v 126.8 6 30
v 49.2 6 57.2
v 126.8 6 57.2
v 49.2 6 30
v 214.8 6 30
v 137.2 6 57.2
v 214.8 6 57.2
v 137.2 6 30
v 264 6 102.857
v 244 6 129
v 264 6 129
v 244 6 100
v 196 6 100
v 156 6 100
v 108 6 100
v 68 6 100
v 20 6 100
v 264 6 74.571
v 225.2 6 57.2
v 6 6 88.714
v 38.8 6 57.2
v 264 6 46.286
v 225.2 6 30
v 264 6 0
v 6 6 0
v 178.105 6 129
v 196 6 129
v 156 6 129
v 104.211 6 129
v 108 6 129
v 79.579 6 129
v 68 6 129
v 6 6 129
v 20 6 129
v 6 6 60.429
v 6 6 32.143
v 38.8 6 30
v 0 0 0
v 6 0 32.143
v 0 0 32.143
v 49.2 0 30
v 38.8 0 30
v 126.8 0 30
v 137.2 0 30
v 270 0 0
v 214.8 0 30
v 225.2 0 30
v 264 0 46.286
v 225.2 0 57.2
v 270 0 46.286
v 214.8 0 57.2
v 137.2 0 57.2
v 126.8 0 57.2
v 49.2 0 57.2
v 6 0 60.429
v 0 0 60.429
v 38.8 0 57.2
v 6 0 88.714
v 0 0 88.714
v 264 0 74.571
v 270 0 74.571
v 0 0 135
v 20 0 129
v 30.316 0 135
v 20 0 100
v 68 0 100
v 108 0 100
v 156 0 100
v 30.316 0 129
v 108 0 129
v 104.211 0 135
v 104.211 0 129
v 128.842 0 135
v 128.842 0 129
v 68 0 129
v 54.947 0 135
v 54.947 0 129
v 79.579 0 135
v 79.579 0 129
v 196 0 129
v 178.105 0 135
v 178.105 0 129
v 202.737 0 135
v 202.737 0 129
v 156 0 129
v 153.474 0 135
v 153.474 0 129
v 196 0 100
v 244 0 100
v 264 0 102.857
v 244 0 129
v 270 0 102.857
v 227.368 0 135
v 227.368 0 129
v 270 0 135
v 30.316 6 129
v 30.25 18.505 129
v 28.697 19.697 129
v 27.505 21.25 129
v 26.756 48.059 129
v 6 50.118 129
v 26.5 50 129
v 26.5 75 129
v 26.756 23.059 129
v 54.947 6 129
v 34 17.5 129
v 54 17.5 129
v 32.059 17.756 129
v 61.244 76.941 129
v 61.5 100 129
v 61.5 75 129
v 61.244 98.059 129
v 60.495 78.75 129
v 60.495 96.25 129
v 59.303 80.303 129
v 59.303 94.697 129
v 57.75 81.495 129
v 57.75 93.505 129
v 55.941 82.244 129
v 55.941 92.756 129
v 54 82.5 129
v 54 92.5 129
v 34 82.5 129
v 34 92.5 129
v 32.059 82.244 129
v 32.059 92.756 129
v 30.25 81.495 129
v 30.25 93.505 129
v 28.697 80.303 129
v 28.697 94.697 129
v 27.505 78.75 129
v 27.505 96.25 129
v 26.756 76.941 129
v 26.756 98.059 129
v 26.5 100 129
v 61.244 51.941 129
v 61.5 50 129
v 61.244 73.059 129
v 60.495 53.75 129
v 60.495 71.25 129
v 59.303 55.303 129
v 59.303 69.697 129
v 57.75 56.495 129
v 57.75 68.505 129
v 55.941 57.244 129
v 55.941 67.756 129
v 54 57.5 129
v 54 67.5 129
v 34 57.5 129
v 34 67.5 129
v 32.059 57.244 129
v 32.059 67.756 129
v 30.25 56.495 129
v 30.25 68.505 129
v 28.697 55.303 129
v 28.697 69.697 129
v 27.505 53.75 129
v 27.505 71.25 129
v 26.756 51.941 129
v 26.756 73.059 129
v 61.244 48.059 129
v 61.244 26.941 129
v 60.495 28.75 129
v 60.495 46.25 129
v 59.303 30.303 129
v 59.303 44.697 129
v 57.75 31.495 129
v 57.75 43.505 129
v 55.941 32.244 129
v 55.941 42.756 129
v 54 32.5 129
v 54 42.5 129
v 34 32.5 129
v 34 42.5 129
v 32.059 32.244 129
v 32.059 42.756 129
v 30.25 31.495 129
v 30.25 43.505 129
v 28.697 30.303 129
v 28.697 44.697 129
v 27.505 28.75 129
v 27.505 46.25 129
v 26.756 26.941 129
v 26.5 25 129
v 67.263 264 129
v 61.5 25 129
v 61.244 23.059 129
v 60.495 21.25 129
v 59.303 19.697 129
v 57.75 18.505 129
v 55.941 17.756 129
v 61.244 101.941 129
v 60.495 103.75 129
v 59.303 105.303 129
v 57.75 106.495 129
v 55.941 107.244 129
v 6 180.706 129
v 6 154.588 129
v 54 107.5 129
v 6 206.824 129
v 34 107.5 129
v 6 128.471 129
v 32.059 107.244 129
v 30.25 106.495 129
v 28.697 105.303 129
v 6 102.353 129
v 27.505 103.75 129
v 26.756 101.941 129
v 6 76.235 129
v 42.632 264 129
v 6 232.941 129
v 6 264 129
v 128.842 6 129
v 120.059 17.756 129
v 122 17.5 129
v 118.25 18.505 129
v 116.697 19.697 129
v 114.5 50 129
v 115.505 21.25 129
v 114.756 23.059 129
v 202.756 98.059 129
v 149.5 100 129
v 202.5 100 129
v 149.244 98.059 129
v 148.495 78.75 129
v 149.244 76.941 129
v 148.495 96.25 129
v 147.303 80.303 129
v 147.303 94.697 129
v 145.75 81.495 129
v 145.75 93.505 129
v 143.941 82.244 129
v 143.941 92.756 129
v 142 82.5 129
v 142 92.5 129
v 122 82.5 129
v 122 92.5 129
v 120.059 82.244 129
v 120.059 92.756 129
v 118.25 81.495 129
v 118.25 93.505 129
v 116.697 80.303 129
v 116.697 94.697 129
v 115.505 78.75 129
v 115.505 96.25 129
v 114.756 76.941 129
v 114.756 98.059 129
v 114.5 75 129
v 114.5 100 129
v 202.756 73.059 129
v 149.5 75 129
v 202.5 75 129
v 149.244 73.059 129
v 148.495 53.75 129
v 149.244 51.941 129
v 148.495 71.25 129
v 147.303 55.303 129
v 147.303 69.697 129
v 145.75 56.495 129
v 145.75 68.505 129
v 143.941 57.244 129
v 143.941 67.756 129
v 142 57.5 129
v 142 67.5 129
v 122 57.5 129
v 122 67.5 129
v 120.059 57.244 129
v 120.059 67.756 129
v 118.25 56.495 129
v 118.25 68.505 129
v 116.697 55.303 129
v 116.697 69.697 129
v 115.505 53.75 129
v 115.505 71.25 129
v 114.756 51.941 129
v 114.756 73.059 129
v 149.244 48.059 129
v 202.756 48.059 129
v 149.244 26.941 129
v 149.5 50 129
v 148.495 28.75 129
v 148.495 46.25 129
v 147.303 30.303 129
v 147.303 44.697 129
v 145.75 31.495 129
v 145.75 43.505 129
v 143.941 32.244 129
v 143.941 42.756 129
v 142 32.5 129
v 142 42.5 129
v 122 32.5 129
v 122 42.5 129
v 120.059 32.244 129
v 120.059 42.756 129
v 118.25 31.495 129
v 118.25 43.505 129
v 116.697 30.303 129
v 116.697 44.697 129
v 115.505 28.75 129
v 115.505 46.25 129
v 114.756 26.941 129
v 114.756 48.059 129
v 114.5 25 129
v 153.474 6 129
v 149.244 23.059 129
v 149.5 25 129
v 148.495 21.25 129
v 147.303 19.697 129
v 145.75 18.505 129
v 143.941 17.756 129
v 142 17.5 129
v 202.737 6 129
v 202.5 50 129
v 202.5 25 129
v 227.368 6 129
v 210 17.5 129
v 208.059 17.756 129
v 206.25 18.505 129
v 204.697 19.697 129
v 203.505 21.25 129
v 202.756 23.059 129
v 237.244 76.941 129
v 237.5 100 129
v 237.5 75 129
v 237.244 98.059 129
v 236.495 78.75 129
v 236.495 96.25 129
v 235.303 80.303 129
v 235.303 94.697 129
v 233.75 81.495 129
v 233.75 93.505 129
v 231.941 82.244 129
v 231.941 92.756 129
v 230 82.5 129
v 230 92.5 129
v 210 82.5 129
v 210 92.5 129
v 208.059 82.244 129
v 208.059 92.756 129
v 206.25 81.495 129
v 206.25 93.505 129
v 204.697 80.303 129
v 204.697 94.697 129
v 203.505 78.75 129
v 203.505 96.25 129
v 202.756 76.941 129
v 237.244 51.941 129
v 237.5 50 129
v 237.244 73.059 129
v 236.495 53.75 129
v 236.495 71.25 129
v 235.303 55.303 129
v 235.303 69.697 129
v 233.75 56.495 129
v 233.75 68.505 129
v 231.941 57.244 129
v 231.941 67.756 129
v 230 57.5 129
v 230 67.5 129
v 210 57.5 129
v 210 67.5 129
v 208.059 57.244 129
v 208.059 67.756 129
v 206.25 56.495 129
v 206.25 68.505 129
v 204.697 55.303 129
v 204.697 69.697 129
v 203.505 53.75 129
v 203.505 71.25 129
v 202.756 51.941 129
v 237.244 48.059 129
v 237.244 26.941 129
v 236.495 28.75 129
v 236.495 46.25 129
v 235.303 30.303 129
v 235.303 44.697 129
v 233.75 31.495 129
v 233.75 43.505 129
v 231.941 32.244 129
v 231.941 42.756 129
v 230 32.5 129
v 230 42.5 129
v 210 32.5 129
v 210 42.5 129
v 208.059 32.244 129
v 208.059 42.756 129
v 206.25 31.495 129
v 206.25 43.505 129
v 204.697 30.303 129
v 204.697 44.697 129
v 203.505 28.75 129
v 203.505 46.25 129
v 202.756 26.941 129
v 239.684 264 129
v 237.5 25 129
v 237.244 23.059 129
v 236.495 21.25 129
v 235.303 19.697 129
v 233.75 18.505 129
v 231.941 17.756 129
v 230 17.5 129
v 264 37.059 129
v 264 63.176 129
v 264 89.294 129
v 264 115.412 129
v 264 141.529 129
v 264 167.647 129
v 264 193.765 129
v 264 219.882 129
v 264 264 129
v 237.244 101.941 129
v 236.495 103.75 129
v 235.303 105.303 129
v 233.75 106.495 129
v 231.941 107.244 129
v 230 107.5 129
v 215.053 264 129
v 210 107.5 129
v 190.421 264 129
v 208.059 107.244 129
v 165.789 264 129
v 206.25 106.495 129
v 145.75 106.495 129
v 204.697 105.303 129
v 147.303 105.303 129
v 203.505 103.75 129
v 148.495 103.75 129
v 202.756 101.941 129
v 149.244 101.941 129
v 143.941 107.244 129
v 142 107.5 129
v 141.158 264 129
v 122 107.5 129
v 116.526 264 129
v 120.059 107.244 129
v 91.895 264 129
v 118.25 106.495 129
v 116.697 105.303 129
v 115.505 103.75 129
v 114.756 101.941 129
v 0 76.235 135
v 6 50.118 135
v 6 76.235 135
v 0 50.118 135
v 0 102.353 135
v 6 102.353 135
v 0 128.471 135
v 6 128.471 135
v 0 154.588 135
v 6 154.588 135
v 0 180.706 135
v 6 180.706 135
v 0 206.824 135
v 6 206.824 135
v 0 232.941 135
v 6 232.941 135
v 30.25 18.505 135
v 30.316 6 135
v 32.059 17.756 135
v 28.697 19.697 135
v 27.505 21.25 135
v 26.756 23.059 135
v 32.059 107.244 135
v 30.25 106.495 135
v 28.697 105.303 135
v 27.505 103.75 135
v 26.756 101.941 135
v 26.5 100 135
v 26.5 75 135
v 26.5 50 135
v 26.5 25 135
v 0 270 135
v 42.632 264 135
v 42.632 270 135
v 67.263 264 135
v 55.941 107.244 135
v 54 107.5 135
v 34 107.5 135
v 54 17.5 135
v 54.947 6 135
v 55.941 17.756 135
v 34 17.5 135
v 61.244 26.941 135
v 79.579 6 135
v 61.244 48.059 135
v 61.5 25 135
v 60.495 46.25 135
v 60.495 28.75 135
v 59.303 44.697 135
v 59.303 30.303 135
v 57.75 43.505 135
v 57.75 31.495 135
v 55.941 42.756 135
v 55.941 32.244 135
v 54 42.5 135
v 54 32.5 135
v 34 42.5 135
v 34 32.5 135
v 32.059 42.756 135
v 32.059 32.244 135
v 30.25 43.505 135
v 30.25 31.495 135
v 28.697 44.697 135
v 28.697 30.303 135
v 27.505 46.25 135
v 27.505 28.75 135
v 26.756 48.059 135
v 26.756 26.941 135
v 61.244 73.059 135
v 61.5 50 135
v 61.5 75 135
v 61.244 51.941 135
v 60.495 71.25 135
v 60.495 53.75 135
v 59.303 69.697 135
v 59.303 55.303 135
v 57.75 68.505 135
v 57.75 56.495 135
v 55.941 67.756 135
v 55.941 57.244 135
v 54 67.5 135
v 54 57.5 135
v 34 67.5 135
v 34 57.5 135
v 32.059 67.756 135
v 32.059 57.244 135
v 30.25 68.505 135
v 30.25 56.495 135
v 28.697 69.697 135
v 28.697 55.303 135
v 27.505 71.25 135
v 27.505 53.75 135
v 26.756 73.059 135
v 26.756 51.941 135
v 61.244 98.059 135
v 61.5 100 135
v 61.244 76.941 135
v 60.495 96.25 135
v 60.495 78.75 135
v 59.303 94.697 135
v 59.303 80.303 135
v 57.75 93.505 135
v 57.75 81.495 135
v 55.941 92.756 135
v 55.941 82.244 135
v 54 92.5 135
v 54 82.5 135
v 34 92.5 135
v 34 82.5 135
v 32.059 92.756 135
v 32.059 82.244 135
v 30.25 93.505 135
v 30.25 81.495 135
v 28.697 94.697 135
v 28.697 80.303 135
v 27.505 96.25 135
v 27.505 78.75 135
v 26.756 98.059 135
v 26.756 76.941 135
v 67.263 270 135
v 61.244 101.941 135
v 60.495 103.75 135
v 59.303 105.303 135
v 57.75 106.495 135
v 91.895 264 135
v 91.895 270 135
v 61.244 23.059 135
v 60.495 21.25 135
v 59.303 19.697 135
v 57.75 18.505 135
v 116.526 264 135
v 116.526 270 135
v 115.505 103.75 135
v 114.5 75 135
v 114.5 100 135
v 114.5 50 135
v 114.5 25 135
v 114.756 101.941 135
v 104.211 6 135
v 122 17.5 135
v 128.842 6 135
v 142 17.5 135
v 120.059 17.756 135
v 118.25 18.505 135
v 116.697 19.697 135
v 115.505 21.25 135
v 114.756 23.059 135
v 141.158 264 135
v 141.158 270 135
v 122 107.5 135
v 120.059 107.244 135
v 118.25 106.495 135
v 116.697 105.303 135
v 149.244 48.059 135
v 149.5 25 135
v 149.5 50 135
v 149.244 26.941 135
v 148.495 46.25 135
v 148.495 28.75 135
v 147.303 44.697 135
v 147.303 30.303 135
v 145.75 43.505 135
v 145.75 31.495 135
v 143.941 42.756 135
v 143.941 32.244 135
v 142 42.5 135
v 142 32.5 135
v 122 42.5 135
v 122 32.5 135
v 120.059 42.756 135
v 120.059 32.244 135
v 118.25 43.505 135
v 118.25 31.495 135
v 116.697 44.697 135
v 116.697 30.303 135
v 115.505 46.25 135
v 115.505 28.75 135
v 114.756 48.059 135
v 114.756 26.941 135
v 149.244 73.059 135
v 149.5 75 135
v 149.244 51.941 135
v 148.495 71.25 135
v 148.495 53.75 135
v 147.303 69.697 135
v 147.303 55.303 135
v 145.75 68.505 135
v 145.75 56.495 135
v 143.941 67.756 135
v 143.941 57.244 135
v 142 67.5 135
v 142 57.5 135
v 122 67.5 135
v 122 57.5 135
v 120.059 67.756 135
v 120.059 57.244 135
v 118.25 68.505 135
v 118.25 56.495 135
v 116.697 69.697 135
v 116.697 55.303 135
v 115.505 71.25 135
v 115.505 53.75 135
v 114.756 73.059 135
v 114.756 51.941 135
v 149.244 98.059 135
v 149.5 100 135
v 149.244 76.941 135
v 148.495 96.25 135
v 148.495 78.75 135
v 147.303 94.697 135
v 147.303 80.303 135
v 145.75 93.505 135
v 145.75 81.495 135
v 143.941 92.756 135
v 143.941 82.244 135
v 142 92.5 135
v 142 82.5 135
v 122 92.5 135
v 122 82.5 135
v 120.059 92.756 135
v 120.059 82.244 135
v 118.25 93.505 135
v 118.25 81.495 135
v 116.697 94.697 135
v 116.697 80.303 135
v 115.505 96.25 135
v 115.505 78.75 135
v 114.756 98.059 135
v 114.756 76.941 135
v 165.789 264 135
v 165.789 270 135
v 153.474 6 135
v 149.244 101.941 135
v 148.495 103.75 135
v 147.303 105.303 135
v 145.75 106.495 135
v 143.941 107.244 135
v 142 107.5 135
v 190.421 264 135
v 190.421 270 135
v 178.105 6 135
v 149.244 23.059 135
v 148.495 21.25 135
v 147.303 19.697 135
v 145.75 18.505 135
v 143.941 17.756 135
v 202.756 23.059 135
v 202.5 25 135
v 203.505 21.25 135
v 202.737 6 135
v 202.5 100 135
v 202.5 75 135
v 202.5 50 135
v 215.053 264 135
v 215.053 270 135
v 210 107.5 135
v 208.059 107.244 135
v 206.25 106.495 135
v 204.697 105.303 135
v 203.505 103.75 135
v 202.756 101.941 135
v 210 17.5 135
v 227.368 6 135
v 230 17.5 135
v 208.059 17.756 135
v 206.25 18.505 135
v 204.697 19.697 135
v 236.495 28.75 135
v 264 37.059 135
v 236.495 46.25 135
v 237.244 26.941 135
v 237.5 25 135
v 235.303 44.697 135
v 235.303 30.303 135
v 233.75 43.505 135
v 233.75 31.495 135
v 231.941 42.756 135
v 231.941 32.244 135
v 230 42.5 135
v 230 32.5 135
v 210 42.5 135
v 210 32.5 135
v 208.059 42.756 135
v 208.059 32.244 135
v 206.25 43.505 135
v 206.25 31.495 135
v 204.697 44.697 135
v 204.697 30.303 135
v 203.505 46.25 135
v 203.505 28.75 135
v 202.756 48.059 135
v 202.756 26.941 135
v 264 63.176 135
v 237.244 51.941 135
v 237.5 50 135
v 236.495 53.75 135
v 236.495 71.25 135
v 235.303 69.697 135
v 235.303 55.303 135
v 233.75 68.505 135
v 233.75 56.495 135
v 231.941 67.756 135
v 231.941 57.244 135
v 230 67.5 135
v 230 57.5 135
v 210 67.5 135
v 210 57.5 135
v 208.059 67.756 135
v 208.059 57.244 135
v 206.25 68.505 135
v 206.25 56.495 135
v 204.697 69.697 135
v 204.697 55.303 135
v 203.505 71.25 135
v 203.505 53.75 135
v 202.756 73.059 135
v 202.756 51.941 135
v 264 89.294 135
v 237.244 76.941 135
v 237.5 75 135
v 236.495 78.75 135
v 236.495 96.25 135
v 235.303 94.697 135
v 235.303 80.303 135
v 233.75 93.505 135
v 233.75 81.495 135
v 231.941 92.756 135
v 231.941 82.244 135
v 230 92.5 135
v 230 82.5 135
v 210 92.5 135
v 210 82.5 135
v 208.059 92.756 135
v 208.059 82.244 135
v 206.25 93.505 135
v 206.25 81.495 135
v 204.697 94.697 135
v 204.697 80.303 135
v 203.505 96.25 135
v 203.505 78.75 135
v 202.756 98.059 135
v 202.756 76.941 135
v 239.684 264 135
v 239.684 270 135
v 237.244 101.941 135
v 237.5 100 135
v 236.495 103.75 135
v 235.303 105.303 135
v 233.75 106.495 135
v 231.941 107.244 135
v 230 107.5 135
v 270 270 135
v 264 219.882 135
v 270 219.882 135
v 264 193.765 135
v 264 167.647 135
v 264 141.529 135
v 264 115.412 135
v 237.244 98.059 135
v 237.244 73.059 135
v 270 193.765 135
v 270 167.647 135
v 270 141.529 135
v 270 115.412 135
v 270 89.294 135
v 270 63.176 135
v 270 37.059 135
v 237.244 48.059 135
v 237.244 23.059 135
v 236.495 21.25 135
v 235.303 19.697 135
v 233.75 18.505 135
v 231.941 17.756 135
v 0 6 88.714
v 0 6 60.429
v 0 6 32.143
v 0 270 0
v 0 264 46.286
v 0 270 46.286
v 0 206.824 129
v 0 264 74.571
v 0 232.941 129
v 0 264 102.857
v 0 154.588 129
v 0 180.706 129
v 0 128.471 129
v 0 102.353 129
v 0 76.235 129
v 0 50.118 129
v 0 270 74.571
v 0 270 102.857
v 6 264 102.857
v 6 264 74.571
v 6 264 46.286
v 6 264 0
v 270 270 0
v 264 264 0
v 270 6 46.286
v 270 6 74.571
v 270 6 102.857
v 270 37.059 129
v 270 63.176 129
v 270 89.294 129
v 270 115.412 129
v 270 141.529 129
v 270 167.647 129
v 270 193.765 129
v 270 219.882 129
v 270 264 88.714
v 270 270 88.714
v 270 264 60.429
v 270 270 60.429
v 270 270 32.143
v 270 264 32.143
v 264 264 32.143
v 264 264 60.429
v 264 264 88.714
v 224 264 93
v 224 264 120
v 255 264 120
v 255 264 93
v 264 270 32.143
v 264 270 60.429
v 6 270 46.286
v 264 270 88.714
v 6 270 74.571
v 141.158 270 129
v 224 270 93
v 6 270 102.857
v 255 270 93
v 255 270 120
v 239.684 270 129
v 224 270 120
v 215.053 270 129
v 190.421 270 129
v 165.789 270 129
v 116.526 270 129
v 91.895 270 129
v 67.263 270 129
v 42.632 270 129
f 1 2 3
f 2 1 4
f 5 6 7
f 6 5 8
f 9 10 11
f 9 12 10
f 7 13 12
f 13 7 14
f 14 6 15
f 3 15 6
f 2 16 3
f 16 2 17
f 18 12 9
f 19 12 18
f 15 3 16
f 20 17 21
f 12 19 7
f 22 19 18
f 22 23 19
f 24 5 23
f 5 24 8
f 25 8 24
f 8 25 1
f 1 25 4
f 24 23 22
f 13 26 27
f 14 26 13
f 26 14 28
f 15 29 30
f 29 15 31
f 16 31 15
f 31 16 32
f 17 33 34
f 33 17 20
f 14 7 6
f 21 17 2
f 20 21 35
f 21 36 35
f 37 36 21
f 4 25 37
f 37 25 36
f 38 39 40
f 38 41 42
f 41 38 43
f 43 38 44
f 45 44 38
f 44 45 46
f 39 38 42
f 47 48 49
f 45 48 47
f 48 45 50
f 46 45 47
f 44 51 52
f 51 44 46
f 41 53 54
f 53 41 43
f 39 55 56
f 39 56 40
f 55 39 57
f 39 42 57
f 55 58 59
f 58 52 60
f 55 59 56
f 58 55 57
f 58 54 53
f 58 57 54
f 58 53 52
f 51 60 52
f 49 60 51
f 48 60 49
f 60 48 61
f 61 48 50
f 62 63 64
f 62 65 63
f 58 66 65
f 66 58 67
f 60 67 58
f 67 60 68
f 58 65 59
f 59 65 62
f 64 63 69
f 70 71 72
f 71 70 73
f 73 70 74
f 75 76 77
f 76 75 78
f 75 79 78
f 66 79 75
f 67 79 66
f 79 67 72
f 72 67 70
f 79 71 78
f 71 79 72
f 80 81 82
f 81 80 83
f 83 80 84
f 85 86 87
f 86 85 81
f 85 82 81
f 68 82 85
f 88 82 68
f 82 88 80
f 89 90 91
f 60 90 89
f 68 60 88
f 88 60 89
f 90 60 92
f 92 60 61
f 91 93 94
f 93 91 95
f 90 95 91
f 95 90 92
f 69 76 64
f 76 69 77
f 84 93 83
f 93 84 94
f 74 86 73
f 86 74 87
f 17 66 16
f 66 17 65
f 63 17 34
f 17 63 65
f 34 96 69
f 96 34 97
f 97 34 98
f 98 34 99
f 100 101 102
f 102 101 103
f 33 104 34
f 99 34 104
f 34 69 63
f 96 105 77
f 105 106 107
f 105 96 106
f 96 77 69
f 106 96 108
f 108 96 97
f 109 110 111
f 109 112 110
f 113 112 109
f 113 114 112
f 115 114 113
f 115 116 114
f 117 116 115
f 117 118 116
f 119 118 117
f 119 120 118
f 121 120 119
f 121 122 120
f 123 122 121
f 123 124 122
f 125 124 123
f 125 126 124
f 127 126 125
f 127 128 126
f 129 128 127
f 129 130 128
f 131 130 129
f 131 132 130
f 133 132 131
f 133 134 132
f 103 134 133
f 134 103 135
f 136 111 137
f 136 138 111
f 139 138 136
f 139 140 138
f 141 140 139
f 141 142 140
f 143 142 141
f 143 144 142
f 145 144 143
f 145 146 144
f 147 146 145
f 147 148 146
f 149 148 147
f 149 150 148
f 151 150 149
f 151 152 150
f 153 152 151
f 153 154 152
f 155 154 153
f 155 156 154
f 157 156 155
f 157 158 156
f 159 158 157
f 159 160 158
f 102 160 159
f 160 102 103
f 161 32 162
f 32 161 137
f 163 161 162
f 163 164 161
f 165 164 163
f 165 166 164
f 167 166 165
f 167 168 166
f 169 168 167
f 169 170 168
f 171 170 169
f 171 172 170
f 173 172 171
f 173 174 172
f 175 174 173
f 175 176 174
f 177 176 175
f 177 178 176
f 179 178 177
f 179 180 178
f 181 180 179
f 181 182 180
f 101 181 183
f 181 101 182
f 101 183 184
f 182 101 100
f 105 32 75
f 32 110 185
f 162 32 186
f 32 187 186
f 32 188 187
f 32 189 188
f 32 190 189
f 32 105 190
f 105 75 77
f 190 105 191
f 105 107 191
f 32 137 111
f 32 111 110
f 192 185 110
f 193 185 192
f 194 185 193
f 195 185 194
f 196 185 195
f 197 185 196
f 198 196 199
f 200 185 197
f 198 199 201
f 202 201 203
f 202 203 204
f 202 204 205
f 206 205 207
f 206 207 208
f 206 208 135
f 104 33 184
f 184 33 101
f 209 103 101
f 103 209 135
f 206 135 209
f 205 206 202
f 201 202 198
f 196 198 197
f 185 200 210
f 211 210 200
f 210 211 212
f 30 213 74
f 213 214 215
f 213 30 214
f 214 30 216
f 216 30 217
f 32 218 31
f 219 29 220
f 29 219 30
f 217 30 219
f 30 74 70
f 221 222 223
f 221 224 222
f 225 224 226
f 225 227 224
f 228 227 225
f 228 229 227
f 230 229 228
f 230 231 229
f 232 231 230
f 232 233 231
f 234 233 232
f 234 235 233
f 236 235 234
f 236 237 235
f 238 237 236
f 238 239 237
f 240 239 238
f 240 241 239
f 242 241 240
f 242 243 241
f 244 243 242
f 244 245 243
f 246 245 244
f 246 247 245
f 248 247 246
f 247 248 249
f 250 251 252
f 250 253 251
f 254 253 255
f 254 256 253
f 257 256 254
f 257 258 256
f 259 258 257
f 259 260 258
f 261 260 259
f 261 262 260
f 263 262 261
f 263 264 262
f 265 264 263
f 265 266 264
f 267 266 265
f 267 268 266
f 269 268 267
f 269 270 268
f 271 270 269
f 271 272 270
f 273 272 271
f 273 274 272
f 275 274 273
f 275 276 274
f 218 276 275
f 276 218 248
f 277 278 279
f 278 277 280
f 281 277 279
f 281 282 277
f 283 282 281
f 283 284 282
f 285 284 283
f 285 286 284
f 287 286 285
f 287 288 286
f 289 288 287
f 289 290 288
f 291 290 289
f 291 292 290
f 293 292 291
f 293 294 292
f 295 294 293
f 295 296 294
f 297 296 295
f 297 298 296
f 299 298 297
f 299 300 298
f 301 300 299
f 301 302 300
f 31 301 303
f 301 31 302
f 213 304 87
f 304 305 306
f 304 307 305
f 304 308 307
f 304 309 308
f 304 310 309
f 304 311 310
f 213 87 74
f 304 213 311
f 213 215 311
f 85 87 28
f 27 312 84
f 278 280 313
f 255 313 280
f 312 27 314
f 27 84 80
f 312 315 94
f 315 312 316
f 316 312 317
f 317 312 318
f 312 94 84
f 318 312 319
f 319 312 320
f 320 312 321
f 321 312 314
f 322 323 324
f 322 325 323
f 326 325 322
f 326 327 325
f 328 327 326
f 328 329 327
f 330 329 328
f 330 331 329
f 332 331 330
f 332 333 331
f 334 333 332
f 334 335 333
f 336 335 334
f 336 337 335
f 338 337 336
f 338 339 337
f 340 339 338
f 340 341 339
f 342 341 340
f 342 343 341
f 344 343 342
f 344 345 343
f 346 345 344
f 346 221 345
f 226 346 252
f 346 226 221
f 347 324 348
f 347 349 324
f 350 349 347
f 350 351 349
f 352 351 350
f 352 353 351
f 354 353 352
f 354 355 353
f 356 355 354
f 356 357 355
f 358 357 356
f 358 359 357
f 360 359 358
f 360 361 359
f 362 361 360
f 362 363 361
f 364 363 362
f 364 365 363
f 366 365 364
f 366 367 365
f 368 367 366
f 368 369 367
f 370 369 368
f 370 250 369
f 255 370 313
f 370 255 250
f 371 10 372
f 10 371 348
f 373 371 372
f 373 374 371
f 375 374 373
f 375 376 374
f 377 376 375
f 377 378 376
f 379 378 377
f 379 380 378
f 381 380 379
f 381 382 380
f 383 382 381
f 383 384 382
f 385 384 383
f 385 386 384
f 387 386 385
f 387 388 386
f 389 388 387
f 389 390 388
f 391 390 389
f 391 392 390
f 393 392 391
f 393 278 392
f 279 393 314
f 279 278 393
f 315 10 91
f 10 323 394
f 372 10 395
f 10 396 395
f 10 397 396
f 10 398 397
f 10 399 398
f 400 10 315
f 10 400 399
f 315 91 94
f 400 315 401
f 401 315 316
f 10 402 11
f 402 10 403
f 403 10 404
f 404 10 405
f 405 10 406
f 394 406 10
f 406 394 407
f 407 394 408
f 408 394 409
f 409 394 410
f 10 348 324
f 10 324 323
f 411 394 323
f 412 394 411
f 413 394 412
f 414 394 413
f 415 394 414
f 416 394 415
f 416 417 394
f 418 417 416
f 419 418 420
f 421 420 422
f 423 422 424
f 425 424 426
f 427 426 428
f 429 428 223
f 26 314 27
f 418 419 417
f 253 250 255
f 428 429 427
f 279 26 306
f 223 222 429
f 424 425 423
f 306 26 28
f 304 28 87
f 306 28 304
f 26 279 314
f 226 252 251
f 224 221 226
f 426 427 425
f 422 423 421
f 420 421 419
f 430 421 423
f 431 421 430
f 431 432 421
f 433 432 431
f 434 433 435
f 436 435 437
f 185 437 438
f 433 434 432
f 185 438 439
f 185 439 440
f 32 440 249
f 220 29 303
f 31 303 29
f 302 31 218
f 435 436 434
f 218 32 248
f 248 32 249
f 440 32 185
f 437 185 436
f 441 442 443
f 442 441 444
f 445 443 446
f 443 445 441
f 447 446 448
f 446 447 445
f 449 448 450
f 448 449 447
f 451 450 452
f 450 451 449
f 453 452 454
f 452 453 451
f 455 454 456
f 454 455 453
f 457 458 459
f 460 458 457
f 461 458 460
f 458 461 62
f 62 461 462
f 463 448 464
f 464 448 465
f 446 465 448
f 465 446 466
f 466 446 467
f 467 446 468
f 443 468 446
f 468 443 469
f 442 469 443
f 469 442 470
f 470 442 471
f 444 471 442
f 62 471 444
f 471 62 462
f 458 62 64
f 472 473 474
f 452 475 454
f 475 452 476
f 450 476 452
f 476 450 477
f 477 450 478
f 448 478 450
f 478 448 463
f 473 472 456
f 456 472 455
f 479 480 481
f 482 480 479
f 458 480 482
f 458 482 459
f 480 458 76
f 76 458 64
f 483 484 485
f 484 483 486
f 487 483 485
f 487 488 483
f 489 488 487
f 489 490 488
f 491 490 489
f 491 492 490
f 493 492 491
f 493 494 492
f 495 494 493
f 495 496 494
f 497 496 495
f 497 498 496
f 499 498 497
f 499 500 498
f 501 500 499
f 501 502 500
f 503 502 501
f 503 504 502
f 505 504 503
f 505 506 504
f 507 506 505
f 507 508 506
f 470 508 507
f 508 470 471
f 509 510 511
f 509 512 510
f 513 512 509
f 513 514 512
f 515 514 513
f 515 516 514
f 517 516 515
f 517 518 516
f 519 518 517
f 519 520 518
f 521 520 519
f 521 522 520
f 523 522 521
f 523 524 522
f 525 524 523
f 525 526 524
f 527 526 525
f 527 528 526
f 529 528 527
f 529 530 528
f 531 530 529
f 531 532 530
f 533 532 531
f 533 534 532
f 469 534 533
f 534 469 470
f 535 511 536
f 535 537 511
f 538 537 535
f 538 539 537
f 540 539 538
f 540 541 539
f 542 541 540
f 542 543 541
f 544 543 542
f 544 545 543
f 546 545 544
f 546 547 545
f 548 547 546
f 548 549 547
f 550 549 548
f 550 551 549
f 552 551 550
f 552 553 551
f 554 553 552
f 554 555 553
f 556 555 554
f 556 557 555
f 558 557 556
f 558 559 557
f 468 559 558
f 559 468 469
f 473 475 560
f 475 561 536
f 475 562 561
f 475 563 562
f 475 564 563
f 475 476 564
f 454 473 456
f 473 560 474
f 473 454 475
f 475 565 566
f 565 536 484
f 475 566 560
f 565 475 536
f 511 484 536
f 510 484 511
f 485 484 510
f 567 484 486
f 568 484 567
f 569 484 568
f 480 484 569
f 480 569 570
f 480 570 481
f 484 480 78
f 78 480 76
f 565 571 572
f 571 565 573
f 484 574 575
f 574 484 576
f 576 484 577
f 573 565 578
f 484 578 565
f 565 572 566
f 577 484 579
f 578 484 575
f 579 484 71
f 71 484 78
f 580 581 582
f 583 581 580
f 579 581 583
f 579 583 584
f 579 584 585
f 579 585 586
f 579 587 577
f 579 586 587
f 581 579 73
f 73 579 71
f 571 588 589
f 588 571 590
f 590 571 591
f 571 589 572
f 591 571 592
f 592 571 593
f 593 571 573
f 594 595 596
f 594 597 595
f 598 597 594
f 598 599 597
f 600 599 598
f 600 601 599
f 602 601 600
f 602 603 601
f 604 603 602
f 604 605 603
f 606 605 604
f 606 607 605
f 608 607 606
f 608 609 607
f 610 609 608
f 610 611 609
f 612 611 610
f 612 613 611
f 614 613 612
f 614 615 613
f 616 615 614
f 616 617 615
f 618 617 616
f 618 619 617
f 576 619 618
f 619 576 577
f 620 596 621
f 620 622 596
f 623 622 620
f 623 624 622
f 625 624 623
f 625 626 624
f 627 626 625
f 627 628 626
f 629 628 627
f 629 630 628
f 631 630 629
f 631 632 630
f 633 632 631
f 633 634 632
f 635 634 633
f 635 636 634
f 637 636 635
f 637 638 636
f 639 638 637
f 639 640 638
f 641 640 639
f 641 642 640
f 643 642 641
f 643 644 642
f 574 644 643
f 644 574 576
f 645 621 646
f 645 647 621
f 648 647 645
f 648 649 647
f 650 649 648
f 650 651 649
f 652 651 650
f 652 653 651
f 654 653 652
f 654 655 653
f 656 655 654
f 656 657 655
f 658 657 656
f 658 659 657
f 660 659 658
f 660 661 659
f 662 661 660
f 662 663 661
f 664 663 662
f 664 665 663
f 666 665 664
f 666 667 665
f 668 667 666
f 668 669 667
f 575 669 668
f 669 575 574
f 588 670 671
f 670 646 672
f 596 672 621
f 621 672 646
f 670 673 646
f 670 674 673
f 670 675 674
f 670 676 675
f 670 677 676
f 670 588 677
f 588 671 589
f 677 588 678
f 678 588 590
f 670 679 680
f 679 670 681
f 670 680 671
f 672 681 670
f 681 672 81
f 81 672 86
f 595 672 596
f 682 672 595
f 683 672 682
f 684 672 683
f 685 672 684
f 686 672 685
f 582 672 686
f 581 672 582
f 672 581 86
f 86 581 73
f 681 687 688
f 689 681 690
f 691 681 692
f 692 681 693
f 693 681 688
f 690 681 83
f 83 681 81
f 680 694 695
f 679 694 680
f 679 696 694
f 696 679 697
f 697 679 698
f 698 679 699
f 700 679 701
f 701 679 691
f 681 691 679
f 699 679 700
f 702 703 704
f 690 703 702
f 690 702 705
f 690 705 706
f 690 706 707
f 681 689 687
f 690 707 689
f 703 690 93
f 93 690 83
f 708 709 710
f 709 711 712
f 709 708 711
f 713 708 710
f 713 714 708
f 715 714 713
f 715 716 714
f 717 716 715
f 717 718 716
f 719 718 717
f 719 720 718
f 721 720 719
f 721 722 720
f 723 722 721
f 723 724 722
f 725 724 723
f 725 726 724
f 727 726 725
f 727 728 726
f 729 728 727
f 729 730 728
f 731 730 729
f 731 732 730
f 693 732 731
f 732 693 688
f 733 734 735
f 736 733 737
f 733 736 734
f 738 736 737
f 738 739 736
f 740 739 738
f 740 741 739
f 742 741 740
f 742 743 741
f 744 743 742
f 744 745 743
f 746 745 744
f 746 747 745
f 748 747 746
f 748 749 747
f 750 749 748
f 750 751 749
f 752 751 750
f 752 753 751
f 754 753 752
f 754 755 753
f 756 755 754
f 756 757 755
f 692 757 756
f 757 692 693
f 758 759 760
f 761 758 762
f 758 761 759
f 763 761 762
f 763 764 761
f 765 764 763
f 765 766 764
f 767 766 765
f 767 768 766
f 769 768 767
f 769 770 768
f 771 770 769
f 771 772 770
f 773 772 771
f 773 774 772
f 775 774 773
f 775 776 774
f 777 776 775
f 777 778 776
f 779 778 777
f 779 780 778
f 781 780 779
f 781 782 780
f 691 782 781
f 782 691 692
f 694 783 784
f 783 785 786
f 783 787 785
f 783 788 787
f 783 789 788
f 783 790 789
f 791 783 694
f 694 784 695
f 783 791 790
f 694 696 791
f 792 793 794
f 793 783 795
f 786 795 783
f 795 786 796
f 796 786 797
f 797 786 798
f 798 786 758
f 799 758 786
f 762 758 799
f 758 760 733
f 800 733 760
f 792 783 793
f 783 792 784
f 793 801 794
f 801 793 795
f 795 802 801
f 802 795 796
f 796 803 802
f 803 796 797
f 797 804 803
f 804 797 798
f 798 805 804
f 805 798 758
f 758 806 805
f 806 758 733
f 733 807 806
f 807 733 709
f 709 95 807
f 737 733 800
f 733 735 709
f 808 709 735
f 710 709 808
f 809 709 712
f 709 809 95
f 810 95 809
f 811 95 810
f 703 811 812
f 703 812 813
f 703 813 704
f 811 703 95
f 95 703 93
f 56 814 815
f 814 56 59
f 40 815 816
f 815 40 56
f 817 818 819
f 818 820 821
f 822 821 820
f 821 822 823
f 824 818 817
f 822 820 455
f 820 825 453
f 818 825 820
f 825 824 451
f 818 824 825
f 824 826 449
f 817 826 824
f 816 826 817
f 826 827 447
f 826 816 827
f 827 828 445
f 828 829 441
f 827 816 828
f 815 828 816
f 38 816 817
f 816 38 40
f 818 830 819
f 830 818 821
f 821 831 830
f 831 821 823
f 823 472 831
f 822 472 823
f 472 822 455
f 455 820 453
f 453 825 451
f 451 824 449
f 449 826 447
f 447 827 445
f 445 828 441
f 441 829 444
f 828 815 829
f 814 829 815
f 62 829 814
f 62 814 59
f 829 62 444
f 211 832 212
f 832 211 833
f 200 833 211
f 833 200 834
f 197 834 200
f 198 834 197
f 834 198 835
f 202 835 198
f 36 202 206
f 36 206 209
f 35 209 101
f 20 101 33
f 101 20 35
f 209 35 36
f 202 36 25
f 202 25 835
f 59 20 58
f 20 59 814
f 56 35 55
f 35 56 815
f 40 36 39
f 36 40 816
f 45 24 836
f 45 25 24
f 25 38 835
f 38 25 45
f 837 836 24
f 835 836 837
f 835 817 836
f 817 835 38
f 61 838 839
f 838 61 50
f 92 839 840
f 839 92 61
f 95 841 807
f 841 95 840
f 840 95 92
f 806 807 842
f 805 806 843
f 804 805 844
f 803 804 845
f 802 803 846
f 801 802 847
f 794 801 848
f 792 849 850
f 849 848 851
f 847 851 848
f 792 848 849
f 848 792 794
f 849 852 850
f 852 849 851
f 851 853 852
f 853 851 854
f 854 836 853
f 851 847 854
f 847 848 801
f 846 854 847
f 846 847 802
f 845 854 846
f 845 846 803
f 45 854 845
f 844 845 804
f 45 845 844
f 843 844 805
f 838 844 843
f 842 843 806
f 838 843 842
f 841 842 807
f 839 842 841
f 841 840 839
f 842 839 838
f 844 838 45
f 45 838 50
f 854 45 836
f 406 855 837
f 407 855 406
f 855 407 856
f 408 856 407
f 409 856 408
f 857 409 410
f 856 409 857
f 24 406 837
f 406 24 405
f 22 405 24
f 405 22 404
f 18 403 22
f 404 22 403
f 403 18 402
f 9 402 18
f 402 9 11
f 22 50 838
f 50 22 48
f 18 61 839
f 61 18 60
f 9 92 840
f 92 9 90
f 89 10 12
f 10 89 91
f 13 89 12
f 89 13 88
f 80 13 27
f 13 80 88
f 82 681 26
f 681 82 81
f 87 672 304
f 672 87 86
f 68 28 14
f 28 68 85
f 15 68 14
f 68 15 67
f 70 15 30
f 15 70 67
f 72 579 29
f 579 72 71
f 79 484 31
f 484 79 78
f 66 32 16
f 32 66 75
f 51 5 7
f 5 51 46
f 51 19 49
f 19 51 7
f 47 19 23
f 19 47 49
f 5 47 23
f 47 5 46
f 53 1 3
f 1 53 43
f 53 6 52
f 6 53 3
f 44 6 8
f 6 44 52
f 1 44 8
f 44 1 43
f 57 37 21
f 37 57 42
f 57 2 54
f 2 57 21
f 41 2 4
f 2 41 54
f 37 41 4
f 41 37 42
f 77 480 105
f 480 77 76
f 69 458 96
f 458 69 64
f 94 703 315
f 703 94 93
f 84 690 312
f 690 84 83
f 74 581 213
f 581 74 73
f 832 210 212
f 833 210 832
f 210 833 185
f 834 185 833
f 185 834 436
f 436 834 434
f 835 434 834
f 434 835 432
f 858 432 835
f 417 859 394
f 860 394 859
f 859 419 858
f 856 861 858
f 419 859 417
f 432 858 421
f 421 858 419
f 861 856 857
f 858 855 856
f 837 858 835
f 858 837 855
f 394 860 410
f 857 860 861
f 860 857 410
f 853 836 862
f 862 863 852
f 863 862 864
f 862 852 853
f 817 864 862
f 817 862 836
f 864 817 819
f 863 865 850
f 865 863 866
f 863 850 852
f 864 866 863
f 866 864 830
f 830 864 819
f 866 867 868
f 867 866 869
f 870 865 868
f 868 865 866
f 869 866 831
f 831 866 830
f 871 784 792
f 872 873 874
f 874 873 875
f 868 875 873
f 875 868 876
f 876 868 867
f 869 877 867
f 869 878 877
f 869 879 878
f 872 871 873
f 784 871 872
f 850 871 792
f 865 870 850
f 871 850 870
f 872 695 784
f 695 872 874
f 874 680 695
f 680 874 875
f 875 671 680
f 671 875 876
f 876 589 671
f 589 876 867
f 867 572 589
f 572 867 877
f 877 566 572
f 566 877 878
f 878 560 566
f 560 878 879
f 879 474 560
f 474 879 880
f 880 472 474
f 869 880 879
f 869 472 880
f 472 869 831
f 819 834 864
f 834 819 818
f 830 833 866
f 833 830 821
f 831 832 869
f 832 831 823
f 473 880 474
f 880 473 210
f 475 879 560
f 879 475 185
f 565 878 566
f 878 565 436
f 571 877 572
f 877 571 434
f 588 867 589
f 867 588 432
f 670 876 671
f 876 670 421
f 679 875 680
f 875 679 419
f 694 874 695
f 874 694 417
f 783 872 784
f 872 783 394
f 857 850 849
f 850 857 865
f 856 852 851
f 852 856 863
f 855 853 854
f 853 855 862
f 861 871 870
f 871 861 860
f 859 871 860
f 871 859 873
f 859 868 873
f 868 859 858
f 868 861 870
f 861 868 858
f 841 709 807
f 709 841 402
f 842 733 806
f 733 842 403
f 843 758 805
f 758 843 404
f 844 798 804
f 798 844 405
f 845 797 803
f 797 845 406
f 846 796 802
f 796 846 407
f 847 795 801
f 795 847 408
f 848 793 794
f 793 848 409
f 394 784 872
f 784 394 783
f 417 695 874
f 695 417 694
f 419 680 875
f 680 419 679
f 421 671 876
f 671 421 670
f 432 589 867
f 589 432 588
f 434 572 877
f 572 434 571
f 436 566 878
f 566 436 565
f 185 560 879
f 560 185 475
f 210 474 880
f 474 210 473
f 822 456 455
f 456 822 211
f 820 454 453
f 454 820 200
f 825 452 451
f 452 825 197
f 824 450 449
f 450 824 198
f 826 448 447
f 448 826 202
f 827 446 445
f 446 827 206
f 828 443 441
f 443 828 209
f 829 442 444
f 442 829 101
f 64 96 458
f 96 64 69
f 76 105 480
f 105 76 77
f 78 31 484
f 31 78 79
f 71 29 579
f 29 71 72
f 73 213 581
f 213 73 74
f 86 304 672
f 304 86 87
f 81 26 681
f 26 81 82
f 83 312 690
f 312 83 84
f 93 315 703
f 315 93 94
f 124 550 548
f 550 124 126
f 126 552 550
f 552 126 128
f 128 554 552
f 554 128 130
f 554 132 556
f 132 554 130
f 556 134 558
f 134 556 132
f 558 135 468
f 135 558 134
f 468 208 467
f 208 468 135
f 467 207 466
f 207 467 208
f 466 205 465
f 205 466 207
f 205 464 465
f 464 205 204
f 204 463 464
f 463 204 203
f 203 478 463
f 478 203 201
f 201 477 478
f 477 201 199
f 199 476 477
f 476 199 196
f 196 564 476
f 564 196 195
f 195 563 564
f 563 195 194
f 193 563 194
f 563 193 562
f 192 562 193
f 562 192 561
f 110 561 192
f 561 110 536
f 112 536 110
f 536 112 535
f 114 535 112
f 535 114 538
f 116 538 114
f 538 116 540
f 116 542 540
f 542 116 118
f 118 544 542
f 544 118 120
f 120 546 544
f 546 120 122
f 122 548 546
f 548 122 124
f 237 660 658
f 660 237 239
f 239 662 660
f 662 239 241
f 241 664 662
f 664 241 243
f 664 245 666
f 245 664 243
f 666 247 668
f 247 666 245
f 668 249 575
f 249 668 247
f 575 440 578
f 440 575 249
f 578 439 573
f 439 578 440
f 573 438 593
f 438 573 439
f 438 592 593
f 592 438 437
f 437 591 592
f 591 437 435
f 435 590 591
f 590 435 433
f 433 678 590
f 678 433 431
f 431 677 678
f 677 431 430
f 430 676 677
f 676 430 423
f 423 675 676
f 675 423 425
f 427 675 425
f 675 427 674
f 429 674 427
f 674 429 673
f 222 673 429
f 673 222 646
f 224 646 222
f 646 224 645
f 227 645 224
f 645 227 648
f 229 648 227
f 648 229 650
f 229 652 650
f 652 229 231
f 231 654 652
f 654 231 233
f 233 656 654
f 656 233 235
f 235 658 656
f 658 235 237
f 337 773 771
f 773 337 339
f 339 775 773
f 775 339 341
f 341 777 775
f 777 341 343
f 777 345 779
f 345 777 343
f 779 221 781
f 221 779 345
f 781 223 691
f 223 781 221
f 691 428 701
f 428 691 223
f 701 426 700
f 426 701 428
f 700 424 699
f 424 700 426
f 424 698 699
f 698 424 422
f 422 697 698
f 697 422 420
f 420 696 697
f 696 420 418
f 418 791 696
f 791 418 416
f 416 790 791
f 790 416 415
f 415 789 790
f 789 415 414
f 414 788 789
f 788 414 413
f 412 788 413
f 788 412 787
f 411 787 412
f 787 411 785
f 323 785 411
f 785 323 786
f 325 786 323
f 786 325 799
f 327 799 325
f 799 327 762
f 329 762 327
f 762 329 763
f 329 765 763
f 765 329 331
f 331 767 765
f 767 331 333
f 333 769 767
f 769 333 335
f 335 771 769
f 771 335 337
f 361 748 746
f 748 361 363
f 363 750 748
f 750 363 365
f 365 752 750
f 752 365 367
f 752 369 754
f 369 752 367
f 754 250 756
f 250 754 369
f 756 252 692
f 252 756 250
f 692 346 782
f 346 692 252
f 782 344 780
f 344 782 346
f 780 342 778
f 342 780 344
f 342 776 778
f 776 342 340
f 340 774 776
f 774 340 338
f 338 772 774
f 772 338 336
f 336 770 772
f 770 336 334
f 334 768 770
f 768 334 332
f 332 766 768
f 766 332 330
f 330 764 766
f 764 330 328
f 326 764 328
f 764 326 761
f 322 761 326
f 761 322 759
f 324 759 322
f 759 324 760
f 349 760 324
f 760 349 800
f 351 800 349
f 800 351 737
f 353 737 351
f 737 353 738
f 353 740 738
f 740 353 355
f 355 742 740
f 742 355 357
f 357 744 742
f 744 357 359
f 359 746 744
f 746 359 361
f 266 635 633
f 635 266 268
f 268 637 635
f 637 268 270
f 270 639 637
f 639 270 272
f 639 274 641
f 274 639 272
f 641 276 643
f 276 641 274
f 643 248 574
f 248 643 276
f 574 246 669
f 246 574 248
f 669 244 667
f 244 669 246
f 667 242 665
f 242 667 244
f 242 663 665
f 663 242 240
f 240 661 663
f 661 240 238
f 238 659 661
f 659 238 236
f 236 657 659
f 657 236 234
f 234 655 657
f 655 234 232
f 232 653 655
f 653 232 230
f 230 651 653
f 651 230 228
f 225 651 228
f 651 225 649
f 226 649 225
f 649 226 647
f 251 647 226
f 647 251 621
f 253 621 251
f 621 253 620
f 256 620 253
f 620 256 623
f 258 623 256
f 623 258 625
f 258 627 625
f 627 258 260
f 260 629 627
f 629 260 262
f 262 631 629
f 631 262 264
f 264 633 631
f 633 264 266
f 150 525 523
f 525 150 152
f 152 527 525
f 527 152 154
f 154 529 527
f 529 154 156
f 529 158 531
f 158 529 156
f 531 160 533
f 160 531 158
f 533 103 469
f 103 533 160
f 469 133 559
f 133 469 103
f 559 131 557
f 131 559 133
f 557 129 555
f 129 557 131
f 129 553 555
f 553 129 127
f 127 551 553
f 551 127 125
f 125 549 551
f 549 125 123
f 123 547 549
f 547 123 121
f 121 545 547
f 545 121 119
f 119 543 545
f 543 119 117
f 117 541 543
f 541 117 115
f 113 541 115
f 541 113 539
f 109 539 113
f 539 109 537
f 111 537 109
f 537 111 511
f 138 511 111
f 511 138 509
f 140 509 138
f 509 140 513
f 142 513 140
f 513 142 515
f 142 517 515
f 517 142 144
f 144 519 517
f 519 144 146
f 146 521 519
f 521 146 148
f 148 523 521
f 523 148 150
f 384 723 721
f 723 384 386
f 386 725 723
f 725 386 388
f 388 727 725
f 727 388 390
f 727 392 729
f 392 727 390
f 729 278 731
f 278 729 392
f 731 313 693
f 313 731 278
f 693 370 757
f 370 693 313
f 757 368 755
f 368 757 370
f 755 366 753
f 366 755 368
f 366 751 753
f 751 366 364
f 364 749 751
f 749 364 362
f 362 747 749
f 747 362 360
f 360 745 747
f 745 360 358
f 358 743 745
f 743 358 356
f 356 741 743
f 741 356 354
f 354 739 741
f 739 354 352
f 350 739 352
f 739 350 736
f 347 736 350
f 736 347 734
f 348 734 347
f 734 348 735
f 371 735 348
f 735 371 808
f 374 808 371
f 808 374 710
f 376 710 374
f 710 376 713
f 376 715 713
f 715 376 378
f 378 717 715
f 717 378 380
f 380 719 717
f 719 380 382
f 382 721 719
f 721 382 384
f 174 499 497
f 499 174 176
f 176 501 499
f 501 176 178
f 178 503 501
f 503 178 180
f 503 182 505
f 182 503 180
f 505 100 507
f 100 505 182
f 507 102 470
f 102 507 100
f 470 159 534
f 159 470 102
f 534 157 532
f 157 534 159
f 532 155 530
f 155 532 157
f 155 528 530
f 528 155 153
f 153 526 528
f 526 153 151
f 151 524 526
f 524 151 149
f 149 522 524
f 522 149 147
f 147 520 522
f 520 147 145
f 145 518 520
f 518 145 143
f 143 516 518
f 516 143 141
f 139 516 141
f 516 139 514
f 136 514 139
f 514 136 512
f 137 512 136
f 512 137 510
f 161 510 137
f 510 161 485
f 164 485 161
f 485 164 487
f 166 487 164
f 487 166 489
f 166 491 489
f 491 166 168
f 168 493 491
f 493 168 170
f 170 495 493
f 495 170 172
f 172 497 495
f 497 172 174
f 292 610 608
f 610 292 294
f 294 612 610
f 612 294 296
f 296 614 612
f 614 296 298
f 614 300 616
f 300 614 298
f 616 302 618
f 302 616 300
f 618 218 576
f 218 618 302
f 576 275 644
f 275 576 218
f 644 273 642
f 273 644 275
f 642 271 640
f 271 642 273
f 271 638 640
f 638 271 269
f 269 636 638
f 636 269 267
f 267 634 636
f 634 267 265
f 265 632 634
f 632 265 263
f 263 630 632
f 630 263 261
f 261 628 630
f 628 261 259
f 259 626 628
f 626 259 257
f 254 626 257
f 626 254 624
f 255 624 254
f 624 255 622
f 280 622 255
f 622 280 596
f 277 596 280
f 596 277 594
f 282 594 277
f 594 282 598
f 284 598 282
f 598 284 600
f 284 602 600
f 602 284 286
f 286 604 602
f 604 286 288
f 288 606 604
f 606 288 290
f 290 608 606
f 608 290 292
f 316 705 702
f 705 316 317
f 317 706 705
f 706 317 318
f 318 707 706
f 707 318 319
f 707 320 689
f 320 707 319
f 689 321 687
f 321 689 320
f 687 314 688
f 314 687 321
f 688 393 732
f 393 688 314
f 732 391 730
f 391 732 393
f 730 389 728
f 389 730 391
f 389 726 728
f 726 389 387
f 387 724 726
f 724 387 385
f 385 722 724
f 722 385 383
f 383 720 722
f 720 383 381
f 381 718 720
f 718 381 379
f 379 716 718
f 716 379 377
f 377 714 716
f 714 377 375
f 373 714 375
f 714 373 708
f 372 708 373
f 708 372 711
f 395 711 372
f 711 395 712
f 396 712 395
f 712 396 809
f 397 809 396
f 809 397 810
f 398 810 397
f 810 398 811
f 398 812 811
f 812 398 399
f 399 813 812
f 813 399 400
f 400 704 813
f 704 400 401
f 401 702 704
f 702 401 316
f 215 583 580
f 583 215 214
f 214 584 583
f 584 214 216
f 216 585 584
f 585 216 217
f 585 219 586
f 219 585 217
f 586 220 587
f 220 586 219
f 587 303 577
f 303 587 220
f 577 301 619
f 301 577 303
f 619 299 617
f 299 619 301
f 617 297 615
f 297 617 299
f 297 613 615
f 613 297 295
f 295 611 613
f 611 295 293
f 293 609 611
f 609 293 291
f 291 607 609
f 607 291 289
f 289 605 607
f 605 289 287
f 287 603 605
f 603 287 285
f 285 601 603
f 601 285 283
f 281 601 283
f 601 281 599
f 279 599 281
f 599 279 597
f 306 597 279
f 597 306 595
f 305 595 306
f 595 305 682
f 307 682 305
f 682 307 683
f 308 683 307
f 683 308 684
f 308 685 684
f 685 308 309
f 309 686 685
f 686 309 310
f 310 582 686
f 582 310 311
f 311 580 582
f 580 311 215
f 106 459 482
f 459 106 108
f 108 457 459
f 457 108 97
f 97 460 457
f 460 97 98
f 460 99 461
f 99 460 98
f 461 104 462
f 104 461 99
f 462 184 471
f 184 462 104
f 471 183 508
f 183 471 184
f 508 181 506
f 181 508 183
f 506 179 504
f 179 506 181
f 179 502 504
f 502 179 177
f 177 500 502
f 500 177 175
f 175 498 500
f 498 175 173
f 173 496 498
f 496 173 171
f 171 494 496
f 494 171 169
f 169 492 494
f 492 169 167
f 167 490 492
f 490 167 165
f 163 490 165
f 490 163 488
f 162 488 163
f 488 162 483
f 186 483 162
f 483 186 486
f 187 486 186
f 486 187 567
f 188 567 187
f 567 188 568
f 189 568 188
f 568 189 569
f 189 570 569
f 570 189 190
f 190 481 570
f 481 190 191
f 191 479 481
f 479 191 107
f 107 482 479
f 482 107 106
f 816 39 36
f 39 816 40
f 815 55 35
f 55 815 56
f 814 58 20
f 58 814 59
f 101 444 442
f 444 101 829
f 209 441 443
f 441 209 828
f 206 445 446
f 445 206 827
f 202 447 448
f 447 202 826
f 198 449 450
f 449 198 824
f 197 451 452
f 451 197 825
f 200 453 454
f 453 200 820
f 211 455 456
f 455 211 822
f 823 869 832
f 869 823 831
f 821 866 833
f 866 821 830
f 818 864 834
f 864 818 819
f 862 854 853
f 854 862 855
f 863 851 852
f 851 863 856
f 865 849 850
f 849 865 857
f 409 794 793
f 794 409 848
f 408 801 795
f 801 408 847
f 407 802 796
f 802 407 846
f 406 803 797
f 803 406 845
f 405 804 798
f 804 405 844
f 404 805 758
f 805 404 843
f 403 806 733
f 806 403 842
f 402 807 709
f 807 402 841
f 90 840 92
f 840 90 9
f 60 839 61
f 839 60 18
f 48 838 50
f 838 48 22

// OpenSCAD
// file: psu-dimensions.scad
total_width = 270;
total_depth = 270;
total_height = 135;

outer_thickness = 3;
inner_thickness = 6;

margin = 15;
cutting_space = 5;

sections = 3;

section_width = (total_width - 2 * outer_thickness) / 3;

half_section_width = section_width / 2;

inner_depth = total_depth - outer_thickness;

switch_height = 27.2;
switch_width = 10.4;

meter_width = 48;
meter_height = 29;

meter_switch_gap = 12;

meter_and_switch_height = max(meter_height, switch_height);
meter_and_switch_width = meter_width + meter_switch_gap + switch_width;

mains_inlet_width = 31;
mains_inlet_height = 27;

switch_offset = 30;
meter_offset = 100;

adjuster_width = 79;
adjuster_height = 42;
adjuster_depth = 42;
adjuster_y_offset = 25;

binding_post_hole_inner_diameter = 15;
binding_post_hole_outer_diameter = 3;
binding_post_rows = 4;
binding_post_spacing = 20;
binding_post_row_spacing = 25;
binding_post_offset = binding_post_row_spacing;

ventilation_panel_start = mains_inlet_width + margin * 3;
ventilation_hole_diameter = 10;
ventilation_hole_spacing = ventilation_hole_diameter * 1.5;
rear_ventilation_holes_per_row = (total_width - (ventilation_panel_start + margin * 2)) / ventilation_hole_spacing;
rear_ventilation_hole_rows = (total_height  - (margin * 2)) / ventilation_hole_spacing;
side_ventilation_area_length = total_depth/3;
side_ventilation_holes_per_row = side_ventilation_area_length / ventilation_hole_spacing;
side_ventilation_hole_rows = (total_height  - (margin * 2)) / ventilation_hole_spacing;

module binding_post_hole_pair(diameter, spacing, join) {
     translate([-spacing/2, 0]) circle(d=diameter);
     translate([spacing/2, 0]) circle(d=diameter);
     if (join) {
         translate([-spacing/2, -diameter/2]) square([spacing, diameter]);
     }
}

module meter_and_switch() {
    translate([-meter_and_switch_width/2, -meter_and_switch_height/2]) {
        square([switch_width, switch_height]);
        translate([switch_width + meter_switch_gap, (switch_height - meter_height)/2]) {
            square([meter_width, meter_height]);
        }
    }
}
// file: psu-case-inner.scad
include <psu-box.scad>
include <psu-dimensions.scad>

module one_front_inner_cutout() {
     translate([half_section_width - switch_width/2, switch_offset]) square([switch_width, switch_height]);
     translate([half_section_width - meter_width/2, meter_offset]) square([meter_width, meter_height]);
}

module one_top_inner_cutout() {
     for (i=[1:binding_post_rows]) {
          translate([half_section_width, i * binding_post_row_spacing]) binding_post_hole_pair(binding_post_hole_inner_diameter, binding_post_spacing, true);
     }
}

module front_inner_cutouts() {
     for (i=[0:sections]) {
          translate([i * section_width, 0]) {
               one_front_inner_cutout();
          }
     }
}

module back_inner_cutouts() {
     translate([margin, total_height - (margin + mains_inlet_height)]) square([mains_inlet_width, mains_inlet_height]);
}

module top_inner_cutouts() {
     for (i=[0:sections]) {
          translate([i * section_width, 0]) {
               one_top_inner_cutout();
          }
     }
}

module psu_case_inner() {
     box(total_width, total_height, total_depth, inner_thickness,
         assemble=true,
         labels=true,
         open_bottom=true) {
          front_inner_cutouts();
          top_inner_cutouts();
          back_inner_cutouts();
     };
}

psu_case_inner();
// main file
include <psu-case-inner.scad>

module cut_inner_top_only() {
     box(total_width, total_height, total_depth, inner_thickness,
         assemble=false,
         cut_parts="top",
         labels=true,
         open_bottom=true) {
          front_inner_cutouts();
          top_inner_cutouts();
          back_inner_cutouts();
          left_inner_cutouts();
          right_inner_cutouts();
     }
}

cut_inner_top_only();
